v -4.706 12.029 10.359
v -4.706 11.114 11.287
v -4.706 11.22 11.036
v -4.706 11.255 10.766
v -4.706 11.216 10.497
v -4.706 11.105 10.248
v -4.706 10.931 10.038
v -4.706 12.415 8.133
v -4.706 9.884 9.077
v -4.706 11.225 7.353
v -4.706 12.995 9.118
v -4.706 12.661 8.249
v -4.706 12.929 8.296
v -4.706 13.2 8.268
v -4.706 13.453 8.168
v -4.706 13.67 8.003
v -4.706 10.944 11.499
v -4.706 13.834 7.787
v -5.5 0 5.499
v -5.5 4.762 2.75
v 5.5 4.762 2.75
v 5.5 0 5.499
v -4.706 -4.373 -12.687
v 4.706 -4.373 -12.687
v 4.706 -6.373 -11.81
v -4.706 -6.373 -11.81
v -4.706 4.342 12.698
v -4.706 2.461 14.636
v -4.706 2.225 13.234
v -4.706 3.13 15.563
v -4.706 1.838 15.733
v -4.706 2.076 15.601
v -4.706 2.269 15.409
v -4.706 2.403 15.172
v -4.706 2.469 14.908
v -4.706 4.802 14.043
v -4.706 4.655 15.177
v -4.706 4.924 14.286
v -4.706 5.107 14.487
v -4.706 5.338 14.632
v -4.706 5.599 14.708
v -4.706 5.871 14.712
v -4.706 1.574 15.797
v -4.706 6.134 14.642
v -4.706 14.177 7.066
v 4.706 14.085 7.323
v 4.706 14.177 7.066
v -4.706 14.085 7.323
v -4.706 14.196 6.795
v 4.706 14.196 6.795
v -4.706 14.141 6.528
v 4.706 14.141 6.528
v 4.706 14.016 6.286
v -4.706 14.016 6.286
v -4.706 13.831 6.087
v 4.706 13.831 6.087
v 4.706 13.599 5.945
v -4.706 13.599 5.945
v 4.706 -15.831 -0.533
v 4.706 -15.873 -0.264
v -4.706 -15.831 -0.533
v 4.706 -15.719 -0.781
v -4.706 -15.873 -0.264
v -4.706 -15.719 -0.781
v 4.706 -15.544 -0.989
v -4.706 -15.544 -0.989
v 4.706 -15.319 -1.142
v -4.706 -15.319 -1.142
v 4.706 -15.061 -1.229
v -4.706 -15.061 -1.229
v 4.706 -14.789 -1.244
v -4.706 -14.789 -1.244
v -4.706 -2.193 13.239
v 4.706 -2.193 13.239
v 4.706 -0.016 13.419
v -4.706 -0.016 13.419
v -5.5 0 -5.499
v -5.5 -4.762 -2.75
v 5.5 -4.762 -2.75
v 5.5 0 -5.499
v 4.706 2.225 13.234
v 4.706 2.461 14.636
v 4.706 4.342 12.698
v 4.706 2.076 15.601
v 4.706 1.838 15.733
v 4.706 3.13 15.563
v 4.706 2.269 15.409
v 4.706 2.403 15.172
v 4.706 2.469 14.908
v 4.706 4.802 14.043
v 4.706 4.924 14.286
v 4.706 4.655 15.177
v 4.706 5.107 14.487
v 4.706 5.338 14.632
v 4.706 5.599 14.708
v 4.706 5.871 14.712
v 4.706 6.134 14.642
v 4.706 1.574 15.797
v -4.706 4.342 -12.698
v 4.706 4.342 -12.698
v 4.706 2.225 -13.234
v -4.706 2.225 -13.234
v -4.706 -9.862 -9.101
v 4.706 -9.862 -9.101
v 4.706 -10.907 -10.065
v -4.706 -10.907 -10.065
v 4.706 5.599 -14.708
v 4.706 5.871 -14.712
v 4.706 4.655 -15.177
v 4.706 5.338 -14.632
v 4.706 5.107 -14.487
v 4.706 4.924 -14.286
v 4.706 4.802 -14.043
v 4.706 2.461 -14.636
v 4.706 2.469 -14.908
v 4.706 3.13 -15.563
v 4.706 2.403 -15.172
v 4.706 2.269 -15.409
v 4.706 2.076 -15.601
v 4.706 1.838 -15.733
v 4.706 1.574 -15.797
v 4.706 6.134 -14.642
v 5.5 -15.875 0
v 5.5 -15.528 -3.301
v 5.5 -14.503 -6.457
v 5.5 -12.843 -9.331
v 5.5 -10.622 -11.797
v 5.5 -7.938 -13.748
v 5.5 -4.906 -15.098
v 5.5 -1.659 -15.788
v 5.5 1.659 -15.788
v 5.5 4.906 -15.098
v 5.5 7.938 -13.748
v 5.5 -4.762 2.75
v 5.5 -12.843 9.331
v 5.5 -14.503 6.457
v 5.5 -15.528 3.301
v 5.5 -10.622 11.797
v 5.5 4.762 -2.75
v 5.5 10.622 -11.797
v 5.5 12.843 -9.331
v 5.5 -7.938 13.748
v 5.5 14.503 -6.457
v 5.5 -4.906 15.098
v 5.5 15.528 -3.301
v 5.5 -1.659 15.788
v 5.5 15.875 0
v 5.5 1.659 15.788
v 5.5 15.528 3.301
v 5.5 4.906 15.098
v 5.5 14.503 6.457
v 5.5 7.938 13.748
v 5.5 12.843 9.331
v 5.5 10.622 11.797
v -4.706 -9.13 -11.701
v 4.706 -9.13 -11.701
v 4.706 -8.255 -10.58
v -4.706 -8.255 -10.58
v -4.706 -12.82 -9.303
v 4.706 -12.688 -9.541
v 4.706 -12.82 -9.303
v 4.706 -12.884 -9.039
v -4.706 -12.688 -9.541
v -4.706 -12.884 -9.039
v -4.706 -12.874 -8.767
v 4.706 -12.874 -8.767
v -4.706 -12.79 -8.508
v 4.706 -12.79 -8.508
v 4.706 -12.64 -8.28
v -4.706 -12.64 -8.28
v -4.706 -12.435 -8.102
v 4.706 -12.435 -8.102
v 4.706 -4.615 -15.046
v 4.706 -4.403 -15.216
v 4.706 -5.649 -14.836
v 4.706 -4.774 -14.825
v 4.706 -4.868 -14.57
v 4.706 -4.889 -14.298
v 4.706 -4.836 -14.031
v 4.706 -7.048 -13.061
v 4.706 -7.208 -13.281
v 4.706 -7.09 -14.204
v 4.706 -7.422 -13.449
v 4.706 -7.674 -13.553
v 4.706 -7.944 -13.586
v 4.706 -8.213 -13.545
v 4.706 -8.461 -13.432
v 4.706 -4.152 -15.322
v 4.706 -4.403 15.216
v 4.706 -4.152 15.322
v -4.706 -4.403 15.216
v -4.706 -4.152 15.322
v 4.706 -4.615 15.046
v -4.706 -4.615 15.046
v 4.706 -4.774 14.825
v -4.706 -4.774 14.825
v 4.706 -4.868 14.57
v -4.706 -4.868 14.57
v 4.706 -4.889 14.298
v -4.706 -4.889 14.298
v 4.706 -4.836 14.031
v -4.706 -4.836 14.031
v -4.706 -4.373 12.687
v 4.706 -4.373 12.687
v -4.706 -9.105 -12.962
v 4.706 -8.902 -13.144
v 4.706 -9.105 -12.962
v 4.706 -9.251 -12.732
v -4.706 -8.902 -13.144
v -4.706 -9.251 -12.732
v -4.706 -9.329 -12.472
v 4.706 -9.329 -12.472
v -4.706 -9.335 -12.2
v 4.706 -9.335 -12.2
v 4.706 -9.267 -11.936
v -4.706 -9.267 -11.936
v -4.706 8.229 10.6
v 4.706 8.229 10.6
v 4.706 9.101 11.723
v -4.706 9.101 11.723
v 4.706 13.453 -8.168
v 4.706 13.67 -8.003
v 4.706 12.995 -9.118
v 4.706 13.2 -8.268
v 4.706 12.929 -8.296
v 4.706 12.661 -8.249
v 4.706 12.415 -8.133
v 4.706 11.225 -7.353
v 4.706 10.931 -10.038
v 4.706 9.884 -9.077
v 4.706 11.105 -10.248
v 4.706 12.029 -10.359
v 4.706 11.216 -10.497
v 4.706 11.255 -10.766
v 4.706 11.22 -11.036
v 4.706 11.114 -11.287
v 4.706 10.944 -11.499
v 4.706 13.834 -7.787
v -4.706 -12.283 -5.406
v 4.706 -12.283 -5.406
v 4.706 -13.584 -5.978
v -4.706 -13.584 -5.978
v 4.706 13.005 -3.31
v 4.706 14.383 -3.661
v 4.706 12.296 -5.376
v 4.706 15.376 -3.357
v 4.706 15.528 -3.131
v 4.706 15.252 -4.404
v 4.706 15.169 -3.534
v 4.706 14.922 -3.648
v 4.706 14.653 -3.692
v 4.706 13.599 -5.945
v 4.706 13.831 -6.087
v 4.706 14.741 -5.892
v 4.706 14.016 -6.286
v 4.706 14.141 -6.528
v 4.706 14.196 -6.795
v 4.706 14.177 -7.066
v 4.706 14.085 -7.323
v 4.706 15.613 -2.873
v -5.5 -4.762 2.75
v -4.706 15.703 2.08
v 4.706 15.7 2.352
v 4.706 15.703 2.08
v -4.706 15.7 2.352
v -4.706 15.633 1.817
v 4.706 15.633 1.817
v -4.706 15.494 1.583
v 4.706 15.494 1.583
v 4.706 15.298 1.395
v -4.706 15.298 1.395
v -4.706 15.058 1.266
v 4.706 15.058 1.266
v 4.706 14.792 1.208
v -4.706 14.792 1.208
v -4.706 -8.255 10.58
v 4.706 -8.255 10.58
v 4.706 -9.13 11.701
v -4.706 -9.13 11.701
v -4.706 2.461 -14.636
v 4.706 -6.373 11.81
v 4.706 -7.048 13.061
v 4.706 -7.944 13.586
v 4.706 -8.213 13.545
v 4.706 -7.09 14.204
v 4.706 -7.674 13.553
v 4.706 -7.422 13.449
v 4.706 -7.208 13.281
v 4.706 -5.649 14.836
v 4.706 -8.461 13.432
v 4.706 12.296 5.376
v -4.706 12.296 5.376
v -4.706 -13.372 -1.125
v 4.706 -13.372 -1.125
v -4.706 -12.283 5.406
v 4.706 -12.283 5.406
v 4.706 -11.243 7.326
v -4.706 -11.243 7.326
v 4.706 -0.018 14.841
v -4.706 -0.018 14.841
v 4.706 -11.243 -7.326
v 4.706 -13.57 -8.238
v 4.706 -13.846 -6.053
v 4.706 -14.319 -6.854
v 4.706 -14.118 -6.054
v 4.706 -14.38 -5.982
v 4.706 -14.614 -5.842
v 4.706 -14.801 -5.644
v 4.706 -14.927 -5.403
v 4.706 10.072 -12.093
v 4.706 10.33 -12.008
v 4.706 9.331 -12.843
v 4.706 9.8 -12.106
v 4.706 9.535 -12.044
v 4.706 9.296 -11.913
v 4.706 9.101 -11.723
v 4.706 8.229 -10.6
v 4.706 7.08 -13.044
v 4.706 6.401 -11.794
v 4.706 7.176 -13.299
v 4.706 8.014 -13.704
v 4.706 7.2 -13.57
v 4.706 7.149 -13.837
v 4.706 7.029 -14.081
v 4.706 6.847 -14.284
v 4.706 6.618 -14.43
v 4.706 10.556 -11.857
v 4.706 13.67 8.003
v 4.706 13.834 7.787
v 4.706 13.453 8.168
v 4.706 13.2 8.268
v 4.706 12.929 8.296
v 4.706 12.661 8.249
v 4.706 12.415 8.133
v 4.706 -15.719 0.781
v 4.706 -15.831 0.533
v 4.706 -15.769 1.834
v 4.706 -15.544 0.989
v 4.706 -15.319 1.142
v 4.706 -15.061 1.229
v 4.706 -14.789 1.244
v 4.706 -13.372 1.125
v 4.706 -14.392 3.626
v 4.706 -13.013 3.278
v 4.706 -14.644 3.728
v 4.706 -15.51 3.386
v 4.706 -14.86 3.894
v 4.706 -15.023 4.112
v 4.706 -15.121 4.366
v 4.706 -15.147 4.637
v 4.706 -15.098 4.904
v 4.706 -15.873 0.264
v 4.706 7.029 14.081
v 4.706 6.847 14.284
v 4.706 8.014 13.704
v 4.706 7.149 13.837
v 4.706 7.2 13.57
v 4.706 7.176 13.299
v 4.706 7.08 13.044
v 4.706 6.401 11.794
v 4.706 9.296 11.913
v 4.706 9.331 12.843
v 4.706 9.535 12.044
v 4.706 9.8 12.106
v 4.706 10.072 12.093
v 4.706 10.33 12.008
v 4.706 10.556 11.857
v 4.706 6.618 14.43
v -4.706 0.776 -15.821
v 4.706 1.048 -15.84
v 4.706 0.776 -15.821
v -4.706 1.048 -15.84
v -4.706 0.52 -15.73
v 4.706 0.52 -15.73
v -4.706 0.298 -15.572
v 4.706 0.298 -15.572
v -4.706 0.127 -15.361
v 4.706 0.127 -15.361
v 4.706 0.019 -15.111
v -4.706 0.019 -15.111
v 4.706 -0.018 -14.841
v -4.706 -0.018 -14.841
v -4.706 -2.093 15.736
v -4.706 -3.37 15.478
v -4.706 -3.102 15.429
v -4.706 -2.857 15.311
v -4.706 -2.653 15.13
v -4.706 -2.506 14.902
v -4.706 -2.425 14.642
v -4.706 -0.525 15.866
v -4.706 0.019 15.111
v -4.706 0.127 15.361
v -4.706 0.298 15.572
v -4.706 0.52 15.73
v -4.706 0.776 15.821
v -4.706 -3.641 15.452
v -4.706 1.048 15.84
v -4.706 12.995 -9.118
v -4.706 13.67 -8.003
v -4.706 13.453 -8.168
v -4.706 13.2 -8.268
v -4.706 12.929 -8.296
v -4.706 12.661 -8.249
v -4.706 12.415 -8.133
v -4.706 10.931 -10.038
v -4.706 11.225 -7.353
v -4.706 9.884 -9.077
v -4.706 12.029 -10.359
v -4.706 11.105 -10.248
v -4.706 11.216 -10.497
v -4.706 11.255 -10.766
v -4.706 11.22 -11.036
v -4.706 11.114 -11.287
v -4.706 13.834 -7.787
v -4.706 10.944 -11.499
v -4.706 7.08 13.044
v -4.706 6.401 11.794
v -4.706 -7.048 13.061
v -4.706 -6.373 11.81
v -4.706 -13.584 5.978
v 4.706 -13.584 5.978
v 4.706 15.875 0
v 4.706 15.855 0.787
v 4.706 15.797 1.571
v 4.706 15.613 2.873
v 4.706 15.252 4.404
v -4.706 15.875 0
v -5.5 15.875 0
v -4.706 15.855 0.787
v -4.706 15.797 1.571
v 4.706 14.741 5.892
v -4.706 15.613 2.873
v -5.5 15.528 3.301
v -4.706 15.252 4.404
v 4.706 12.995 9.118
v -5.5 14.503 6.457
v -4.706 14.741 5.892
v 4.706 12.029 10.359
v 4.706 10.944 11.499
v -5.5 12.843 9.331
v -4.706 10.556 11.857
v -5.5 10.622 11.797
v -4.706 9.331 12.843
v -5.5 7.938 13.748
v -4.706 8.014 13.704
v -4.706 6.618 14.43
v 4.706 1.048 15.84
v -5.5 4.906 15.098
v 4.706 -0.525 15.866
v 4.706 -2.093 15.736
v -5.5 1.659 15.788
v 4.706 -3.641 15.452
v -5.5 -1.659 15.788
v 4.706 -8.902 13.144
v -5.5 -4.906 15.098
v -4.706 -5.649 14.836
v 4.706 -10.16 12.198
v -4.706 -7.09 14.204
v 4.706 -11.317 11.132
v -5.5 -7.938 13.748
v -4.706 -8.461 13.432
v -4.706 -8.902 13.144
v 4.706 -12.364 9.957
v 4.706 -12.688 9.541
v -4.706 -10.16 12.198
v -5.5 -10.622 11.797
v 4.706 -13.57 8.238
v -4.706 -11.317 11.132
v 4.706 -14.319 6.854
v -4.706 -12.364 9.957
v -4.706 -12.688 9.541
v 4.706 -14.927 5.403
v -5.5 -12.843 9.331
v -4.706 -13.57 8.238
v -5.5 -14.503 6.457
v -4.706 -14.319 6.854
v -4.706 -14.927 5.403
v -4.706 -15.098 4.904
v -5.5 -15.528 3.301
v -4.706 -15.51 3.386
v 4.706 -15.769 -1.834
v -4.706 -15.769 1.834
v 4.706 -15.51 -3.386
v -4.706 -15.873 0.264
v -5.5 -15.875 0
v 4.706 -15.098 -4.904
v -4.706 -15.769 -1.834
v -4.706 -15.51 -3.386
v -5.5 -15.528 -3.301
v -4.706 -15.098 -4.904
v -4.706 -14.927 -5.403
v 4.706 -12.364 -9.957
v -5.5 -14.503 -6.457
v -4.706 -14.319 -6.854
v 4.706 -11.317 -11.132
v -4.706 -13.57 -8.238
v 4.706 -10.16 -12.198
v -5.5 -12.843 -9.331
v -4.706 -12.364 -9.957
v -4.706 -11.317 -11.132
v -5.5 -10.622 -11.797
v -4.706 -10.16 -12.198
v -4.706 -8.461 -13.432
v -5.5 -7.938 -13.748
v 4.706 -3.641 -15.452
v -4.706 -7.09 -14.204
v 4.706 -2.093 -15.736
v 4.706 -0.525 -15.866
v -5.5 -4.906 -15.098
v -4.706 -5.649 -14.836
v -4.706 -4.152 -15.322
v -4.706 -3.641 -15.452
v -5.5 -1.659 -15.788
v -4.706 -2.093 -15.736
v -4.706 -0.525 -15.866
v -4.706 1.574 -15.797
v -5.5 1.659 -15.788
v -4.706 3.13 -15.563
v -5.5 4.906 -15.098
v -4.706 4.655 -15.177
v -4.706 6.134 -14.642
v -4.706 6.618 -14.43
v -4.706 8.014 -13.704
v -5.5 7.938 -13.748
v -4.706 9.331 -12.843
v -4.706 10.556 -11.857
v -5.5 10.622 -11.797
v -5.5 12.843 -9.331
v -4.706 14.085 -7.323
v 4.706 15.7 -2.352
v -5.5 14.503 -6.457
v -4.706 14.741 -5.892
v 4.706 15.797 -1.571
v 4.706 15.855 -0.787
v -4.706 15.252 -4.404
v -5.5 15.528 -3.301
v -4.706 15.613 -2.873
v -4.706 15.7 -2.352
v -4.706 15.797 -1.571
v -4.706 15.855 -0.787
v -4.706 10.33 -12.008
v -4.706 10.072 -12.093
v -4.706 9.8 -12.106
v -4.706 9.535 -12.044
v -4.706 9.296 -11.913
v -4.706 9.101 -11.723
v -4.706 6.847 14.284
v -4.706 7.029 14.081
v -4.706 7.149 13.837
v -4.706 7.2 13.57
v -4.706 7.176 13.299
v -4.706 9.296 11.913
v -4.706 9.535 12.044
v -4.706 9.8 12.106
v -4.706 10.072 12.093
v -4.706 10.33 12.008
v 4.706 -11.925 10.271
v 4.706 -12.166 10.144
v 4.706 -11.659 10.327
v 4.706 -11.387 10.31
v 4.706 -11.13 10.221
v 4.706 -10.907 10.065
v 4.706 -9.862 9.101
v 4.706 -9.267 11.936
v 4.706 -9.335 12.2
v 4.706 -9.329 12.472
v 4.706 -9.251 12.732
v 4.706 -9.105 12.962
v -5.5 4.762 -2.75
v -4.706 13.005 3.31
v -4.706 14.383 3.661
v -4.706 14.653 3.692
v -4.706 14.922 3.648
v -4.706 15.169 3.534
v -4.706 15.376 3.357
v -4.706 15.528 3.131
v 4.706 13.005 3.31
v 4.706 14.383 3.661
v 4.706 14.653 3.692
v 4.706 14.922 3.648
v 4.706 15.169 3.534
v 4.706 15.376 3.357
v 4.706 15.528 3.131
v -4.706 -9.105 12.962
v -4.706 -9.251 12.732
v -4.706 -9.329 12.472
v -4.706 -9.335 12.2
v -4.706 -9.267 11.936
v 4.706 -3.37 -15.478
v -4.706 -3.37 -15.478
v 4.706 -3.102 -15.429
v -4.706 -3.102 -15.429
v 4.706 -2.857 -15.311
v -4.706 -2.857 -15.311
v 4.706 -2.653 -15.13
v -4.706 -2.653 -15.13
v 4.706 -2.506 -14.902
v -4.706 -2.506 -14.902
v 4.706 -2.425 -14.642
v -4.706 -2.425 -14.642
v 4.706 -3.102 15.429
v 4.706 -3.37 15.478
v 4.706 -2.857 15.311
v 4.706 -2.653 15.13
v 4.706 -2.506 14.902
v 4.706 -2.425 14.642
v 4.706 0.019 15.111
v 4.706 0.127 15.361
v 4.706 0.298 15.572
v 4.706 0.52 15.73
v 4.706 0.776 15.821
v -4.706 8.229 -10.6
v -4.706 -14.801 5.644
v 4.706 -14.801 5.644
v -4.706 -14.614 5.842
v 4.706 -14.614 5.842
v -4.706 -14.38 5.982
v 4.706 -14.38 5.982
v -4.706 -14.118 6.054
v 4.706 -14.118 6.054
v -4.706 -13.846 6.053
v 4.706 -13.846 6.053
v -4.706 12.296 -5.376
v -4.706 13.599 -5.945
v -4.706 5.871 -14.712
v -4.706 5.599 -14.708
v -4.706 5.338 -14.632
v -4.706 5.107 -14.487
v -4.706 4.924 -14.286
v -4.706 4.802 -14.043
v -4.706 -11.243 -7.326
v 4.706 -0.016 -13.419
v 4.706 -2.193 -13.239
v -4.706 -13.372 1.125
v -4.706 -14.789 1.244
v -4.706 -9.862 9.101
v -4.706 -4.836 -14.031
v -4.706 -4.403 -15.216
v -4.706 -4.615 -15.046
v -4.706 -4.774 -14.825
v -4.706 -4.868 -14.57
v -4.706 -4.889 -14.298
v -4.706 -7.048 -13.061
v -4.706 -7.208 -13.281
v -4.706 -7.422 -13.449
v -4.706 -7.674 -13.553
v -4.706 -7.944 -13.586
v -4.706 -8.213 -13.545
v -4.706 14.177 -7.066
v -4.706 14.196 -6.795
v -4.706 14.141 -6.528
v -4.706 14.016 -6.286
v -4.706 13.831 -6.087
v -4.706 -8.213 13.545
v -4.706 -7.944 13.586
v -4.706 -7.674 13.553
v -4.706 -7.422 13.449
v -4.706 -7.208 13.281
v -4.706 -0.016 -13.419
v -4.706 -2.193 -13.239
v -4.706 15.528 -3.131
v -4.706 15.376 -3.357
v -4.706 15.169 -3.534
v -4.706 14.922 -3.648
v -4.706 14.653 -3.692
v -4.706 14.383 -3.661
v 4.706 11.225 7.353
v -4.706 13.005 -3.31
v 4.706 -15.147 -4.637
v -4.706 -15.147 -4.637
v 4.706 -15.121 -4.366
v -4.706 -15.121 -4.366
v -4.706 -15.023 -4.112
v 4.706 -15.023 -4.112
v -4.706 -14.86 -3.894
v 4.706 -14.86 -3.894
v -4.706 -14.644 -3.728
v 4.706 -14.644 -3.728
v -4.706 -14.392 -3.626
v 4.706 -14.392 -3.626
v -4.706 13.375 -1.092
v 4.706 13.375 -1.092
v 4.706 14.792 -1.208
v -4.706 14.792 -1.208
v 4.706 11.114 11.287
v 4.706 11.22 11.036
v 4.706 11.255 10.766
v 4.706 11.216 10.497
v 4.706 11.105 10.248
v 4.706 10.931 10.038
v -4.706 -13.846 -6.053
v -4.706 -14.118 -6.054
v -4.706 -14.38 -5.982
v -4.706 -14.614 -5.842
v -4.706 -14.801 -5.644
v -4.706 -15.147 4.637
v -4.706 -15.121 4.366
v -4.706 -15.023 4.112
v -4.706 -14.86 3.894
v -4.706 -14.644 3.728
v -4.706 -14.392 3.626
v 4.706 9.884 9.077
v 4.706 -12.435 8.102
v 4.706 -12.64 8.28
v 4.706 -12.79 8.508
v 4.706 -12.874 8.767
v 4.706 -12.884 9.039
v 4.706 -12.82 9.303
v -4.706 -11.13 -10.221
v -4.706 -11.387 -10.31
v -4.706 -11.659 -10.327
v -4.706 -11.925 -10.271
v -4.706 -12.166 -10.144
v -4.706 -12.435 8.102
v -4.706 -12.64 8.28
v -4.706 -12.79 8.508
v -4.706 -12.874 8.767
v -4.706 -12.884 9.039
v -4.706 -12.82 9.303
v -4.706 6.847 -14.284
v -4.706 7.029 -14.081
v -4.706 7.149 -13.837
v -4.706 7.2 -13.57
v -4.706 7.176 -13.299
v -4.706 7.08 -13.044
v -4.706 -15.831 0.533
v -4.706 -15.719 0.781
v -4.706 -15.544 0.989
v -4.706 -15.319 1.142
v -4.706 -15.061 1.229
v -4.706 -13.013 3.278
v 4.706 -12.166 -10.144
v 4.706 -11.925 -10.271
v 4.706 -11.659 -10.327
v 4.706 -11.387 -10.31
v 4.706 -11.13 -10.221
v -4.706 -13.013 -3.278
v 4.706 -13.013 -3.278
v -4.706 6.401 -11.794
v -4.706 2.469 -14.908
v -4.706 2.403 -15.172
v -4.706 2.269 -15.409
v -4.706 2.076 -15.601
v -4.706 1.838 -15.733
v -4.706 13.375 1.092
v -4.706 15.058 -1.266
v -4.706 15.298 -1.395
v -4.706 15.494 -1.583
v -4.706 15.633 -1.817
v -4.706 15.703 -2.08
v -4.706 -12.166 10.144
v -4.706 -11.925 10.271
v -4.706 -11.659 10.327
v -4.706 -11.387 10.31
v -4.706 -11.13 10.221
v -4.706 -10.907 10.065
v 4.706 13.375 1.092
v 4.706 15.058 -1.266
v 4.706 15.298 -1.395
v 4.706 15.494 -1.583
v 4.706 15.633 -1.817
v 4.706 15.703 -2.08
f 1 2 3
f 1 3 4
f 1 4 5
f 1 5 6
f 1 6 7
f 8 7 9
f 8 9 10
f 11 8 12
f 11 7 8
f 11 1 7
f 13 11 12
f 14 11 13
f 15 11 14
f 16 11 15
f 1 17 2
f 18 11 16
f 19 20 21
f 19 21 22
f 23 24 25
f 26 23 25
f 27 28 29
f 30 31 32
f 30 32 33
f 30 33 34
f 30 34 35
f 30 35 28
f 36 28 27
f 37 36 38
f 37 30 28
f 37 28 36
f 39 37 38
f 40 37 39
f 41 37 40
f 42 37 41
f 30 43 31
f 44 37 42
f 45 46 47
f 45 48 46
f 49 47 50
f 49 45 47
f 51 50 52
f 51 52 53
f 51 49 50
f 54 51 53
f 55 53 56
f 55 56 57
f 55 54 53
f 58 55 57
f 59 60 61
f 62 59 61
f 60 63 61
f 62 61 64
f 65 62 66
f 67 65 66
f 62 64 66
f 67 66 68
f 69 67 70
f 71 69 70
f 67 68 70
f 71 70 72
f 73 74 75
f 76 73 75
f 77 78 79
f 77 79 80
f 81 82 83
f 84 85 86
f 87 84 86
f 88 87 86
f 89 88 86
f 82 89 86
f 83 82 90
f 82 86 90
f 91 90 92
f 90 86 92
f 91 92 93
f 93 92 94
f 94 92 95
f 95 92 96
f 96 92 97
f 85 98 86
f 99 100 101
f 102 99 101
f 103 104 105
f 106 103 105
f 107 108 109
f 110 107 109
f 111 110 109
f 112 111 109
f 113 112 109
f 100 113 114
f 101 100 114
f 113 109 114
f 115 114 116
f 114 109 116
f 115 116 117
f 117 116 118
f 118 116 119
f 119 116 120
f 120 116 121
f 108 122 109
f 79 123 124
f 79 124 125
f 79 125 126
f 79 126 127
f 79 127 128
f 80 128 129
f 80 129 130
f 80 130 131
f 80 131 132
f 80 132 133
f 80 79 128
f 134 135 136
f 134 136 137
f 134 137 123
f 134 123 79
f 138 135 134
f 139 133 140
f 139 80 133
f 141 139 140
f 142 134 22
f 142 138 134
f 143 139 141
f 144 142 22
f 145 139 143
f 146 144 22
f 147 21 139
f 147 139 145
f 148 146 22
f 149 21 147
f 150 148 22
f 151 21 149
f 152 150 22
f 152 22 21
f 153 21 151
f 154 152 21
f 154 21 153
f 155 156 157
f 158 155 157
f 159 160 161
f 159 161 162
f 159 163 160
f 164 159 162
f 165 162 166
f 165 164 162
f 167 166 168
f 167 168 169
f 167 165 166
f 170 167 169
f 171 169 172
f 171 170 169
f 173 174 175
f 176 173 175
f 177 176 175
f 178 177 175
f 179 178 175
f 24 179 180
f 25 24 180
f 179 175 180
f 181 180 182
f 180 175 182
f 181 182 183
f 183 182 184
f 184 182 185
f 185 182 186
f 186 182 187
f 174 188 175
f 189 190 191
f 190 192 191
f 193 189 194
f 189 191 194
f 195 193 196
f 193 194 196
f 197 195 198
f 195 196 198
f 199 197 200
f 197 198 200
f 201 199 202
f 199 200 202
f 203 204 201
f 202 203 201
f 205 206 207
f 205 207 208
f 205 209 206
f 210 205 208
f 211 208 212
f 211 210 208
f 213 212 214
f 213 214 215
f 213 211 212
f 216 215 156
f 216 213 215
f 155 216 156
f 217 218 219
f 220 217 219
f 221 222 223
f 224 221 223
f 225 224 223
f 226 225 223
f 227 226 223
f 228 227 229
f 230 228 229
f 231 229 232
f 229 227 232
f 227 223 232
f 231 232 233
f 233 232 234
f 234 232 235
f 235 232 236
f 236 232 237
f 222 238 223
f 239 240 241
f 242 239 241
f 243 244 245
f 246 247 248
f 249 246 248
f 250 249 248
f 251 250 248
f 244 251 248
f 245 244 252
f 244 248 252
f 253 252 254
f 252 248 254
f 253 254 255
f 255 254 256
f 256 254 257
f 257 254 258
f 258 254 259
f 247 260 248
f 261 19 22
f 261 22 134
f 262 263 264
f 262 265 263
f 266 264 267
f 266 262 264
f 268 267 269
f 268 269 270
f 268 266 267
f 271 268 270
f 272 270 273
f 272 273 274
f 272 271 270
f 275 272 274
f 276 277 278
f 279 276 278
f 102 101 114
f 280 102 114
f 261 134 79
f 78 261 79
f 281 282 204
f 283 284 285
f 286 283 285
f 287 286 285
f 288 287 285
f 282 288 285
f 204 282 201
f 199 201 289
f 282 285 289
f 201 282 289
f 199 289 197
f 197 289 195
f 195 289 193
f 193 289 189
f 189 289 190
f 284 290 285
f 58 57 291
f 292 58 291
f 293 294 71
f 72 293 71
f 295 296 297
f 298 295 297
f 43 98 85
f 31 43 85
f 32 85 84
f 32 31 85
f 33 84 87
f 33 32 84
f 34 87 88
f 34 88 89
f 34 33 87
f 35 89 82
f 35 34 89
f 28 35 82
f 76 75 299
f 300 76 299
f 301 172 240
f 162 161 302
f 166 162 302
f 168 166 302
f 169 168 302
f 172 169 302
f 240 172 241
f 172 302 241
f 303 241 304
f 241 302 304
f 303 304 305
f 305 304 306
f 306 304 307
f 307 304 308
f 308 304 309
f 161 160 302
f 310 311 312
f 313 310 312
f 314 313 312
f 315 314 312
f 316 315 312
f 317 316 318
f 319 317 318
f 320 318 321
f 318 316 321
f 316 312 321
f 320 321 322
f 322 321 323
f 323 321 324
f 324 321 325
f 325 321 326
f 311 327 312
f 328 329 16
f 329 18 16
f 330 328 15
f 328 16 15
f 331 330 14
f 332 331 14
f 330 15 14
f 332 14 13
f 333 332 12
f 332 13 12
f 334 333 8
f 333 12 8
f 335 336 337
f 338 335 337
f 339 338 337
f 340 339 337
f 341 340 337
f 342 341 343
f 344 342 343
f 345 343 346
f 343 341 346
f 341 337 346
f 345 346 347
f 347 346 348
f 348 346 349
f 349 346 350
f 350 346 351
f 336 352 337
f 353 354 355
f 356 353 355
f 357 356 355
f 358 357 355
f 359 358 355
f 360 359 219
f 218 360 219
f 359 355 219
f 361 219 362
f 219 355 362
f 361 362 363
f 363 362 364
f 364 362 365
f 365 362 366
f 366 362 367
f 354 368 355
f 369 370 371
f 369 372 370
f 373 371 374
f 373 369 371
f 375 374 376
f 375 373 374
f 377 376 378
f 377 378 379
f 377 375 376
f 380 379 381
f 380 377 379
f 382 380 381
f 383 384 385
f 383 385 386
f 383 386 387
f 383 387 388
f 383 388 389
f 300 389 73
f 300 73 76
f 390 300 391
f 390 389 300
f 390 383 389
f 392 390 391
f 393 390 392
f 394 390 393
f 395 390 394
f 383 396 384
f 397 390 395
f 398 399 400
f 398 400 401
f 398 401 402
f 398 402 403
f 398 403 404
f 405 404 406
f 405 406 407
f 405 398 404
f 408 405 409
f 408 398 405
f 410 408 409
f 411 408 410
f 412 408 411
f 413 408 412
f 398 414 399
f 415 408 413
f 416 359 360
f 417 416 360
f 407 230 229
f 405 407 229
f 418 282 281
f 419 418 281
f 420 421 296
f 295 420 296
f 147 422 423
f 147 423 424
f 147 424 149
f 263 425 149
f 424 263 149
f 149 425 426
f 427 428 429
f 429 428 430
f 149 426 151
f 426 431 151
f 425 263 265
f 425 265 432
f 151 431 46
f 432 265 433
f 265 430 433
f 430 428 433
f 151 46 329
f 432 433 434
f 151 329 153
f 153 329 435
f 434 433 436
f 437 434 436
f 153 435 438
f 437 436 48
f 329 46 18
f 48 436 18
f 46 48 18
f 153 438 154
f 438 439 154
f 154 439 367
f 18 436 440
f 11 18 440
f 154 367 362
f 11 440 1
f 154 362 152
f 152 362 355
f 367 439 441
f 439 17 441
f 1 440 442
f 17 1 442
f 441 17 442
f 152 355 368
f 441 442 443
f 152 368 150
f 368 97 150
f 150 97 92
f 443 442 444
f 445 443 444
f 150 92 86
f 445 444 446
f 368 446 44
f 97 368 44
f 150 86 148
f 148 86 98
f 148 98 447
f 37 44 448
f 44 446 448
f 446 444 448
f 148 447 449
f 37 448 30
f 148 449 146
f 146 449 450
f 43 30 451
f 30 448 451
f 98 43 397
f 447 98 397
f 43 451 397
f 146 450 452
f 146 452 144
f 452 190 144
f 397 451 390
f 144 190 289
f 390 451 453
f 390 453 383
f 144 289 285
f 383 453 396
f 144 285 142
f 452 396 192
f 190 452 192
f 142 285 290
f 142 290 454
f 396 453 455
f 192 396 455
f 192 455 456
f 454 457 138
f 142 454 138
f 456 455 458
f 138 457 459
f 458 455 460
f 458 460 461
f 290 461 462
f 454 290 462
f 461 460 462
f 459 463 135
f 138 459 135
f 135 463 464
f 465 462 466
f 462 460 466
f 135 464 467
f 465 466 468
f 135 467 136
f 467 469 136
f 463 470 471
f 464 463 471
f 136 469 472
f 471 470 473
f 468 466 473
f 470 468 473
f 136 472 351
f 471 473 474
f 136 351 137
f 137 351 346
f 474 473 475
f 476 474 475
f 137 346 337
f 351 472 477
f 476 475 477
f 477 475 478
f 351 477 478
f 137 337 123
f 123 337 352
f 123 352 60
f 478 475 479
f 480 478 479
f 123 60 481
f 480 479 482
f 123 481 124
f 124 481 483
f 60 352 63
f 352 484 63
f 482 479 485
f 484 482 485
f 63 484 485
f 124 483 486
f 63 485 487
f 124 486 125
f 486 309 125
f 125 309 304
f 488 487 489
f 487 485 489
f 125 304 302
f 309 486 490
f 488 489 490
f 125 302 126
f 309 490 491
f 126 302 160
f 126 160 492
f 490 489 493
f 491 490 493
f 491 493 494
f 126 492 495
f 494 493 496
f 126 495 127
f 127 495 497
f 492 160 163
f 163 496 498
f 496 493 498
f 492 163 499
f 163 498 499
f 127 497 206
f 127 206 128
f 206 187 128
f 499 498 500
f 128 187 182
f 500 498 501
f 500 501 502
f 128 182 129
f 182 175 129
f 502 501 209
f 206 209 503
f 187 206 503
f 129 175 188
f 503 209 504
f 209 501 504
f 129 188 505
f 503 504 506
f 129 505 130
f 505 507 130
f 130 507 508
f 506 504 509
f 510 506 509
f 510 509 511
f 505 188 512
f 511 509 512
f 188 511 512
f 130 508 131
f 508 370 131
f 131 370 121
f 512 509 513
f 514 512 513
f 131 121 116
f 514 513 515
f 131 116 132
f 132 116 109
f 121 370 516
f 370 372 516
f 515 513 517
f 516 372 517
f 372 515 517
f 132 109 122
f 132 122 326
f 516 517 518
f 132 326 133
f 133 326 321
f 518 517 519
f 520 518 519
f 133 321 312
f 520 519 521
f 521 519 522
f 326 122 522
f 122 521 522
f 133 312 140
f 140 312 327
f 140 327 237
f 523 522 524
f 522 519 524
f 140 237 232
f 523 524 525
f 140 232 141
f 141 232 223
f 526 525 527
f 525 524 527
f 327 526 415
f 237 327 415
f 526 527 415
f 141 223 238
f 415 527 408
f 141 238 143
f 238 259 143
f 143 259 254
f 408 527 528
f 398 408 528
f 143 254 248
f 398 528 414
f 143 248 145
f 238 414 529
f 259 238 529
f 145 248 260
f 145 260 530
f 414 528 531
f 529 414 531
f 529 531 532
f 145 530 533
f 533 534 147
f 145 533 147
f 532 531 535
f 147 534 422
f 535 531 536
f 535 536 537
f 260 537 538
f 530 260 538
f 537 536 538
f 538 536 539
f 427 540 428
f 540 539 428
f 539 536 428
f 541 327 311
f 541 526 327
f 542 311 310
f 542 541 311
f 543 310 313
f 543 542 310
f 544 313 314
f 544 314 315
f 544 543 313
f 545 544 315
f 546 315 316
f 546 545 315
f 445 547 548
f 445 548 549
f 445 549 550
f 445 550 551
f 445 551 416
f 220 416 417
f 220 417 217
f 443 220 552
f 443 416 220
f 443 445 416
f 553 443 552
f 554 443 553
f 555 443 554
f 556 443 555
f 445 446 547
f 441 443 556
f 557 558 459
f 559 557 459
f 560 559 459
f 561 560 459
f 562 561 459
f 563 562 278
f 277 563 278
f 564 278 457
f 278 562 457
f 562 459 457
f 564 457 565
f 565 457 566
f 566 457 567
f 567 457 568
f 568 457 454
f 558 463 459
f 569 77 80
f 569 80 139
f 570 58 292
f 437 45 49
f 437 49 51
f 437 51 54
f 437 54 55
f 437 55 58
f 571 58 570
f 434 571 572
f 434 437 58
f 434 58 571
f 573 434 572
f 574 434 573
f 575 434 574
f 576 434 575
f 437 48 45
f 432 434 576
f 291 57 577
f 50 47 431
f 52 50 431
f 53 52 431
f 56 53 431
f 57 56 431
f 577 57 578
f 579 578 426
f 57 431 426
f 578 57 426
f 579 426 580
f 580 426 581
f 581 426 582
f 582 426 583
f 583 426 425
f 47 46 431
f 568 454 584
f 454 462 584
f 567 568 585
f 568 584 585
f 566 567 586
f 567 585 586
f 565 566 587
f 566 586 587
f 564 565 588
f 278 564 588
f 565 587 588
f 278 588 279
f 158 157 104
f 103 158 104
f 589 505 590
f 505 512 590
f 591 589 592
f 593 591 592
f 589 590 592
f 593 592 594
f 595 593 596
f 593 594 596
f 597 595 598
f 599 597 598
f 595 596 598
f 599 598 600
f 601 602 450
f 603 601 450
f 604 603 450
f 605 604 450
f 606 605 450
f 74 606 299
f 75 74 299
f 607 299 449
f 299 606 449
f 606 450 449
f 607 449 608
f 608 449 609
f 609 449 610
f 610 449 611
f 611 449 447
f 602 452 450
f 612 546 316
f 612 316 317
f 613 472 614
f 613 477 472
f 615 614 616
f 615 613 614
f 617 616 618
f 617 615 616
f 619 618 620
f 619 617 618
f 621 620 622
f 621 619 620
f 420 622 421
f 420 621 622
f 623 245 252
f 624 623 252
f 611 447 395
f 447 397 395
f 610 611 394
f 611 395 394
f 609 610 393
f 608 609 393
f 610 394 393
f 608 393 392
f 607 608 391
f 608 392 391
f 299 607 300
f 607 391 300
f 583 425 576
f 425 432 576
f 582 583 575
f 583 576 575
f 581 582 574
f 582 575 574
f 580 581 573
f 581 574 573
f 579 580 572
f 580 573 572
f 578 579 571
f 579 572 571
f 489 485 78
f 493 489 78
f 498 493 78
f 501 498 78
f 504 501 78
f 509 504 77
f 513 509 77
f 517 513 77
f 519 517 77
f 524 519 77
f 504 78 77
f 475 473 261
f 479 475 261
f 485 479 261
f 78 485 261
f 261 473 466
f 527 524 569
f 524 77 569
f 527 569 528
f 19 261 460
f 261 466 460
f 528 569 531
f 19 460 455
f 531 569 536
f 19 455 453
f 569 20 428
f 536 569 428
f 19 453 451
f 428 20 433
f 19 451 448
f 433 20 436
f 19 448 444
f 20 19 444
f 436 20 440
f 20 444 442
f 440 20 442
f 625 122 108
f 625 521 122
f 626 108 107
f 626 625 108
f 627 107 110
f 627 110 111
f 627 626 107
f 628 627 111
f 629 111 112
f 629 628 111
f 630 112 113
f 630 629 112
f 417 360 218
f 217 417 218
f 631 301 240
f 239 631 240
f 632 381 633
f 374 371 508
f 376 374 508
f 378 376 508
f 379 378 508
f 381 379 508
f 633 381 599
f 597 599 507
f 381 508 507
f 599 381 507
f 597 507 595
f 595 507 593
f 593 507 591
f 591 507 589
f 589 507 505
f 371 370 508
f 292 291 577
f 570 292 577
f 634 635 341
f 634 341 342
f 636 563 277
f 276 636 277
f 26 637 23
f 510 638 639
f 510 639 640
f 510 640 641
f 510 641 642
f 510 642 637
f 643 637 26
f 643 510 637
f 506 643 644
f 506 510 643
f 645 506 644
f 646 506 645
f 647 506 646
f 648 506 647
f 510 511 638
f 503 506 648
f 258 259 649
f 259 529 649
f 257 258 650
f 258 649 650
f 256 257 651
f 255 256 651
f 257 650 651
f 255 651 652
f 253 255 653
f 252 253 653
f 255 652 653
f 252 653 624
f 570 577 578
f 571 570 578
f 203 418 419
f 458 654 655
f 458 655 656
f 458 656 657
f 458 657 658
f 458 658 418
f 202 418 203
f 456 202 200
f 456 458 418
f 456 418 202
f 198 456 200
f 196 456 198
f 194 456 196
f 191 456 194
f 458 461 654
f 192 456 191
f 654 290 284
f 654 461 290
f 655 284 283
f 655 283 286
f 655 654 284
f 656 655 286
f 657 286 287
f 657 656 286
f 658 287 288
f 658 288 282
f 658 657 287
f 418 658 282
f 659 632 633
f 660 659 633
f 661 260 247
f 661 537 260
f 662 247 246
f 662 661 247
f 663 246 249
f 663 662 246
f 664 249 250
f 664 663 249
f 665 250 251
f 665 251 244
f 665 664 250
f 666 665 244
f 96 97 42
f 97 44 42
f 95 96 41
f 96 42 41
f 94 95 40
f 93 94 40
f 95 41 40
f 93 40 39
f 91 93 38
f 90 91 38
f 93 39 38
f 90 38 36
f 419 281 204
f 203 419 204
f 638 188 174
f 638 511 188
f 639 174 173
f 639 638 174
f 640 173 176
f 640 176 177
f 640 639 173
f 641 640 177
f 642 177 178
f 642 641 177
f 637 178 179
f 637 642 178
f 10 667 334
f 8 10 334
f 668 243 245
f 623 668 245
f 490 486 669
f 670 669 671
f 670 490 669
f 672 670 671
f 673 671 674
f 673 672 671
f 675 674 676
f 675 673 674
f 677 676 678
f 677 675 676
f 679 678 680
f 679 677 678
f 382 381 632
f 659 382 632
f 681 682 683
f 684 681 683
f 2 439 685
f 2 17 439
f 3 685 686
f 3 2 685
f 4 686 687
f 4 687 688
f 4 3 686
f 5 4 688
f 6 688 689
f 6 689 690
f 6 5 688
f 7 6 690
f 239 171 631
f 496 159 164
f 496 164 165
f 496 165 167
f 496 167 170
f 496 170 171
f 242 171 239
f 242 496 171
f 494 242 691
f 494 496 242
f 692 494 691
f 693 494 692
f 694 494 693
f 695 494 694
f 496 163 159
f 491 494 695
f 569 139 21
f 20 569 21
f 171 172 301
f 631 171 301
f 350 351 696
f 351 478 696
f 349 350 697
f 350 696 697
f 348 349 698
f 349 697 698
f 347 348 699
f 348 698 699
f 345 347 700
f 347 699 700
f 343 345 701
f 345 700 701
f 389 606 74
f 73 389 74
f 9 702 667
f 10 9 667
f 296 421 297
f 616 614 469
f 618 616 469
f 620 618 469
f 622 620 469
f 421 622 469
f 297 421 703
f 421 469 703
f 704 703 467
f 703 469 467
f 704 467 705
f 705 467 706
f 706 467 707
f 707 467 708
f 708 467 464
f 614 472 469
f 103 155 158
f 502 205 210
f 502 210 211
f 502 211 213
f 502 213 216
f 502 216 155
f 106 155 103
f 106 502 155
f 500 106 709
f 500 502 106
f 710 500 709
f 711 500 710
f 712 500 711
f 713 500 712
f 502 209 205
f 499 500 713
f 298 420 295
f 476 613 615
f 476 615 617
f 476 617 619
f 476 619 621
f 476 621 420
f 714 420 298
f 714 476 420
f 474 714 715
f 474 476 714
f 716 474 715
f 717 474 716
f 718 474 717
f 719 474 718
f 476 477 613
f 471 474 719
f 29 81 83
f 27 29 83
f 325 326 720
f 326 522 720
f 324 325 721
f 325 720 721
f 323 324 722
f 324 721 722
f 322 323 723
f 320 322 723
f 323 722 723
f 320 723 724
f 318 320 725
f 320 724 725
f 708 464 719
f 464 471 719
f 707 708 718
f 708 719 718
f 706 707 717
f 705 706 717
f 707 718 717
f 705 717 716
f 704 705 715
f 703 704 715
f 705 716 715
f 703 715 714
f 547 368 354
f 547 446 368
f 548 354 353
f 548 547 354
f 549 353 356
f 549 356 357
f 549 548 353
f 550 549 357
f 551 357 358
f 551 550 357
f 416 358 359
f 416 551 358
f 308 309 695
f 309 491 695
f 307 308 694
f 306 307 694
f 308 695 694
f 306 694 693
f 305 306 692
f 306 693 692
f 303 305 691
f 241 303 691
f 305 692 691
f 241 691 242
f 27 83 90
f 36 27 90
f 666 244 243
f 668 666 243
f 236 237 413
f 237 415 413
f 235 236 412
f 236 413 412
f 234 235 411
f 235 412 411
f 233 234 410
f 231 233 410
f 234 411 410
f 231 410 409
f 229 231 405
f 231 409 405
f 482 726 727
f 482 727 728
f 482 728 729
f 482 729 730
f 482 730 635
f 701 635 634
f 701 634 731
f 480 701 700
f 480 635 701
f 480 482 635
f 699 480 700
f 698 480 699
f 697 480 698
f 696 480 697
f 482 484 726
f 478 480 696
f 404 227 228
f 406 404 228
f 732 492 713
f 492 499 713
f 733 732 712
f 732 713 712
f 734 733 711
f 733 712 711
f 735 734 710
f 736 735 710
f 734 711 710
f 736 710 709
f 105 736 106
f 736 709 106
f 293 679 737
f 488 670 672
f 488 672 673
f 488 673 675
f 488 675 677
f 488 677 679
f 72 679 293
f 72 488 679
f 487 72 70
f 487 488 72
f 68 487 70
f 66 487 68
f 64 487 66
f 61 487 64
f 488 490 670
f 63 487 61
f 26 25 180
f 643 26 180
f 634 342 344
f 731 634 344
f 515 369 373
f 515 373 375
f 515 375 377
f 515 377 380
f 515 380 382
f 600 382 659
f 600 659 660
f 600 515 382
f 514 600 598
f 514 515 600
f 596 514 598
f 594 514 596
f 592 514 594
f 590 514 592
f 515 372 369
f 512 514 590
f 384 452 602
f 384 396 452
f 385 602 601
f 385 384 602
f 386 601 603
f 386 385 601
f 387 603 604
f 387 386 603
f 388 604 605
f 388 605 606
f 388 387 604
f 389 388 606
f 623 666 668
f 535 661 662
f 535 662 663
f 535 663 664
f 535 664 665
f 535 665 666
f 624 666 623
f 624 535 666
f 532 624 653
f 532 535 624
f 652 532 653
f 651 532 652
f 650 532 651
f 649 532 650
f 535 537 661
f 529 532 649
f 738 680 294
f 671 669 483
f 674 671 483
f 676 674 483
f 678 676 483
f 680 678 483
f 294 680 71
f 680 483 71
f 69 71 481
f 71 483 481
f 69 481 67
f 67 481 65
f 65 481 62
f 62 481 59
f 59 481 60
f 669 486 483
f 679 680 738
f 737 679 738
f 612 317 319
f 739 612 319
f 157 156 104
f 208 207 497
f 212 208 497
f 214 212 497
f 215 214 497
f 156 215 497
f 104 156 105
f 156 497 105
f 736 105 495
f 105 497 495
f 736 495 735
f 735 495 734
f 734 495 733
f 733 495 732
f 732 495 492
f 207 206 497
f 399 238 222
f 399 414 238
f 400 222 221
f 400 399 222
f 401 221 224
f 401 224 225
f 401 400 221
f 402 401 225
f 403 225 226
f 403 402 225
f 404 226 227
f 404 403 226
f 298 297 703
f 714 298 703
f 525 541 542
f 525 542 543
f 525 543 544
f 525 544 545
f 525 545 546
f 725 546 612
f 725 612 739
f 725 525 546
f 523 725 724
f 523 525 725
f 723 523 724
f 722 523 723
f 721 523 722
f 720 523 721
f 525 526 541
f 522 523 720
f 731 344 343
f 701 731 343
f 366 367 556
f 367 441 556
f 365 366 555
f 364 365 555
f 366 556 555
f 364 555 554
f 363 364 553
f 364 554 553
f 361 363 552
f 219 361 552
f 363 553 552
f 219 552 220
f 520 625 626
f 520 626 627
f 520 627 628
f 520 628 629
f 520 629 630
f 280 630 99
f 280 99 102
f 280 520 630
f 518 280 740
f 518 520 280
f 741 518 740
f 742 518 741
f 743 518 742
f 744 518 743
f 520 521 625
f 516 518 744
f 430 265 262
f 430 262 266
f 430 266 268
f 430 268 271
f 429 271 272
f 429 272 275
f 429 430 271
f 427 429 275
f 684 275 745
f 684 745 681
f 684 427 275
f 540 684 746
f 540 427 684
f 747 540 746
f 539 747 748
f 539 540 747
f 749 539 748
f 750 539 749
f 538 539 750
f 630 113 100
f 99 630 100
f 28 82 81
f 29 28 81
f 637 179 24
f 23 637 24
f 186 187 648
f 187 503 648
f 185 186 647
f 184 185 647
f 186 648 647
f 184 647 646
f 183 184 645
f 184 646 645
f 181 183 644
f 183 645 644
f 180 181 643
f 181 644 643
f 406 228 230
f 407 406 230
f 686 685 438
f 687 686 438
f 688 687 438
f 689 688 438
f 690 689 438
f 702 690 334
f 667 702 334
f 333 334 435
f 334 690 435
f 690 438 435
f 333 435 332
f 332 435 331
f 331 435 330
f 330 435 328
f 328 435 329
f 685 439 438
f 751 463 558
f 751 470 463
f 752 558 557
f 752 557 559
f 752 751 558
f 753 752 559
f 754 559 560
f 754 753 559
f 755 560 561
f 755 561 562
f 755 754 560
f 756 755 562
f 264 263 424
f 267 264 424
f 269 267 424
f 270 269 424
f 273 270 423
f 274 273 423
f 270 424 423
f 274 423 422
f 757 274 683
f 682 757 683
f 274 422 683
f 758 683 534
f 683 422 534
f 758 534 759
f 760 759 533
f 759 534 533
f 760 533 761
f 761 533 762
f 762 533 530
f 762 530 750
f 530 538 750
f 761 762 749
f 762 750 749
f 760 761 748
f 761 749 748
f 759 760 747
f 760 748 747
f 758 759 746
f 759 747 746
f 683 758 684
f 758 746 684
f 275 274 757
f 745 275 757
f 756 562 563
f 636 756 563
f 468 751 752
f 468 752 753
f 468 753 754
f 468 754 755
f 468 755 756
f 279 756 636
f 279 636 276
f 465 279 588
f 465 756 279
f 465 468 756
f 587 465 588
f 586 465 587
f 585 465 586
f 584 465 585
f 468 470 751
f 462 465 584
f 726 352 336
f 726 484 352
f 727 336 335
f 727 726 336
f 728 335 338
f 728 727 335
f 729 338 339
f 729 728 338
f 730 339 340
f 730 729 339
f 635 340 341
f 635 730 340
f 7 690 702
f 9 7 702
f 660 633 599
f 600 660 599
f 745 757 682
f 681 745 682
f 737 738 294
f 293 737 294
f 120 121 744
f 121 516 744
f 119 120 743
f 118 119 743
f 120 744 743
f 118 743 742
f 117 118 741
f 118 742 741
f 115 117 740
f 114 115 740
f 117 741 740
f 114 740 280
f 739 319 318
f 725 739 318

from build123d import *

# Parameters (mm, degrees)
REVOLVE1_START           = -5.5
REVOLVE1_OUTLINE_R       = 15.875
REVOLVE1_OUTLINE_R_2     = 3.175
REVOLVE1_DEPTH           = 11
CUT_EXTRUDE1_START       = -0.79375
CUT_EXTRUDE1_DEPTH       = 9.4125
FILLET1_R                = 1
CIRPATTERN1_COUNT        = 19
FILLET1_OF_CIRPATTERN1_R = 1
CUT_EXTRUDE2_DEPTH       = 26.000624992


# Read off the part's stored shape, not the designer's step: Revolve1
with BuildPart() as part:
    # Revolve1 outline → Revolve1 (new body)
    with BuildSketch(Plane.YZ.offset(REVOLVE1_START)):
        Circle(REVOLVE1_OUTLINE_R)
        Circle(REVOLVE1_OUTLINE_R_2, mode=Mode.SUBTRACT)
    extrude(amount=REVOLVE1_DEPTH)

    # Sketch2 → Cut-Extrude1 (cut)
    with BuildSketch(Plane(origin=(5.5, 0, 0), x_dir=(0, 0, -1), z_dir=(1, 0, 0)).offset(CUT_EXTRUDE1_START)):
        Polygon((-1.091836735, 13.375), (1.091836735, 13.375), (1.5, 18.375), (-1.5, 18.375), align=None)
    cut_extrude1 = extrude(amount=-CUT_EXTRUDE1_DEPTH, mode=Mode.SUBTRACT)

    # Fillet1
    fillet1_edges = [part.edges().sort_by_distance(p)[0] for p in [
        (0, 15.822368276, -1.2916219),
        (0, 15.822368276, 1.2916219),
    ]]
    fillet(fillet1_edges, radius=FILLET1_R)

    # CirPattern1: Cut-Extrude1 ×19 about axis
    cirpattern1_axis = Axis((0, 0, 0), (1, 0, 0))
    for i in range(1, CIRPATTERN1_COUNT):
        add(cut_extrude1.rotate(cirpattern1_axis, i * 360 / CIRPATTERN1_COUNT), mode=Mode.SUBTRACT)

    # Fillet1 of CirPattern1
    fillet1_of_cirpattern1_edges = [part.edges().sort_by_distance(p)[0] for p in [
        (0, 15.384457666, 3.915876318),
        (0, 14.545679775, 6.359152844),
        (0, 13.279402352, 8.699028576),
        (0, 11.69274117, 10.737570904),
        (0, 9.735317743, 12.539506108),
        (0, 7.572712628, 13.952406547),
        (0, 5.136260397, 15.021133583),
        (0, 2.632063171, 15.655282446),
        (0, -0.01939046, 15.874988158),
        (0, -2.593811173, 15.661665576),
        (0, -5.172940059, 15.008541439),
        (0, -7.538605828, 13.970864224),
        (0, -9.765921337, 12.515686375),
        (0, -11.666475568, 10.766102954),
        (0, -13.300613505, 8.66656249),
        (0, -14.530101657, 6.394667375),
        (0, -15.393977818, 3.878282085),
        (0, -15.819165773, 1.330270363),
        (0, -15.819165773, -1.330270363),
        (0, -15.393977818, -3.878282085),
        (0, -14.530101657, -6.394667375),
        (0, -13.300613505, -8.66656249),
        (0, -11.666475568, -10.766102954),
        (0, -9.765921337, -12.515686375),
        (0, -7.538605828, -13.970864224),
        (0, -5.172940059, -15.008541439),
        (0, -2.593811173, -15.661665576),
        (0, -0.01939046, -15.874988158),
        (0, 2.632063171, -15.655282446),
        (0, 5.136260397, -15.021133583),
        (0, 7.572712628, -13.952406547),
        (0, 9.735317743, -12.539506108),
        (0, 11.69274117, -10.737570904),
        (0, 13.279402352, -8.699028576),
        (0, 14.545679775, -6.359152844),
        (0, 15.384457666, -3.915876318),
    ]]
    fillet(fillet1_of_cirpattern1_edges, radius=FILLET1_OF_CIRPATTERN1_R)

    # Sketch3 → Cut-Extrude2 (cut, through all)
    with BuildSketch(Plane(origin=(5.5, 0, 0), x_dir=(0, 0, -1), z_dir=(1, 0, 0))):
        Polygon((5.499261314, 0), (2.749630657, 4.7625), (-2.749630657, 4.7625), (-5.499261314, 0), (-2.749630657, -4.7625), (2.749630657, -4.7625), align=None)
    extrude(amount=-CUT_EXTRUDE2_DEPTH, mode=Mode.SUBTRACT)


solid = part.part
